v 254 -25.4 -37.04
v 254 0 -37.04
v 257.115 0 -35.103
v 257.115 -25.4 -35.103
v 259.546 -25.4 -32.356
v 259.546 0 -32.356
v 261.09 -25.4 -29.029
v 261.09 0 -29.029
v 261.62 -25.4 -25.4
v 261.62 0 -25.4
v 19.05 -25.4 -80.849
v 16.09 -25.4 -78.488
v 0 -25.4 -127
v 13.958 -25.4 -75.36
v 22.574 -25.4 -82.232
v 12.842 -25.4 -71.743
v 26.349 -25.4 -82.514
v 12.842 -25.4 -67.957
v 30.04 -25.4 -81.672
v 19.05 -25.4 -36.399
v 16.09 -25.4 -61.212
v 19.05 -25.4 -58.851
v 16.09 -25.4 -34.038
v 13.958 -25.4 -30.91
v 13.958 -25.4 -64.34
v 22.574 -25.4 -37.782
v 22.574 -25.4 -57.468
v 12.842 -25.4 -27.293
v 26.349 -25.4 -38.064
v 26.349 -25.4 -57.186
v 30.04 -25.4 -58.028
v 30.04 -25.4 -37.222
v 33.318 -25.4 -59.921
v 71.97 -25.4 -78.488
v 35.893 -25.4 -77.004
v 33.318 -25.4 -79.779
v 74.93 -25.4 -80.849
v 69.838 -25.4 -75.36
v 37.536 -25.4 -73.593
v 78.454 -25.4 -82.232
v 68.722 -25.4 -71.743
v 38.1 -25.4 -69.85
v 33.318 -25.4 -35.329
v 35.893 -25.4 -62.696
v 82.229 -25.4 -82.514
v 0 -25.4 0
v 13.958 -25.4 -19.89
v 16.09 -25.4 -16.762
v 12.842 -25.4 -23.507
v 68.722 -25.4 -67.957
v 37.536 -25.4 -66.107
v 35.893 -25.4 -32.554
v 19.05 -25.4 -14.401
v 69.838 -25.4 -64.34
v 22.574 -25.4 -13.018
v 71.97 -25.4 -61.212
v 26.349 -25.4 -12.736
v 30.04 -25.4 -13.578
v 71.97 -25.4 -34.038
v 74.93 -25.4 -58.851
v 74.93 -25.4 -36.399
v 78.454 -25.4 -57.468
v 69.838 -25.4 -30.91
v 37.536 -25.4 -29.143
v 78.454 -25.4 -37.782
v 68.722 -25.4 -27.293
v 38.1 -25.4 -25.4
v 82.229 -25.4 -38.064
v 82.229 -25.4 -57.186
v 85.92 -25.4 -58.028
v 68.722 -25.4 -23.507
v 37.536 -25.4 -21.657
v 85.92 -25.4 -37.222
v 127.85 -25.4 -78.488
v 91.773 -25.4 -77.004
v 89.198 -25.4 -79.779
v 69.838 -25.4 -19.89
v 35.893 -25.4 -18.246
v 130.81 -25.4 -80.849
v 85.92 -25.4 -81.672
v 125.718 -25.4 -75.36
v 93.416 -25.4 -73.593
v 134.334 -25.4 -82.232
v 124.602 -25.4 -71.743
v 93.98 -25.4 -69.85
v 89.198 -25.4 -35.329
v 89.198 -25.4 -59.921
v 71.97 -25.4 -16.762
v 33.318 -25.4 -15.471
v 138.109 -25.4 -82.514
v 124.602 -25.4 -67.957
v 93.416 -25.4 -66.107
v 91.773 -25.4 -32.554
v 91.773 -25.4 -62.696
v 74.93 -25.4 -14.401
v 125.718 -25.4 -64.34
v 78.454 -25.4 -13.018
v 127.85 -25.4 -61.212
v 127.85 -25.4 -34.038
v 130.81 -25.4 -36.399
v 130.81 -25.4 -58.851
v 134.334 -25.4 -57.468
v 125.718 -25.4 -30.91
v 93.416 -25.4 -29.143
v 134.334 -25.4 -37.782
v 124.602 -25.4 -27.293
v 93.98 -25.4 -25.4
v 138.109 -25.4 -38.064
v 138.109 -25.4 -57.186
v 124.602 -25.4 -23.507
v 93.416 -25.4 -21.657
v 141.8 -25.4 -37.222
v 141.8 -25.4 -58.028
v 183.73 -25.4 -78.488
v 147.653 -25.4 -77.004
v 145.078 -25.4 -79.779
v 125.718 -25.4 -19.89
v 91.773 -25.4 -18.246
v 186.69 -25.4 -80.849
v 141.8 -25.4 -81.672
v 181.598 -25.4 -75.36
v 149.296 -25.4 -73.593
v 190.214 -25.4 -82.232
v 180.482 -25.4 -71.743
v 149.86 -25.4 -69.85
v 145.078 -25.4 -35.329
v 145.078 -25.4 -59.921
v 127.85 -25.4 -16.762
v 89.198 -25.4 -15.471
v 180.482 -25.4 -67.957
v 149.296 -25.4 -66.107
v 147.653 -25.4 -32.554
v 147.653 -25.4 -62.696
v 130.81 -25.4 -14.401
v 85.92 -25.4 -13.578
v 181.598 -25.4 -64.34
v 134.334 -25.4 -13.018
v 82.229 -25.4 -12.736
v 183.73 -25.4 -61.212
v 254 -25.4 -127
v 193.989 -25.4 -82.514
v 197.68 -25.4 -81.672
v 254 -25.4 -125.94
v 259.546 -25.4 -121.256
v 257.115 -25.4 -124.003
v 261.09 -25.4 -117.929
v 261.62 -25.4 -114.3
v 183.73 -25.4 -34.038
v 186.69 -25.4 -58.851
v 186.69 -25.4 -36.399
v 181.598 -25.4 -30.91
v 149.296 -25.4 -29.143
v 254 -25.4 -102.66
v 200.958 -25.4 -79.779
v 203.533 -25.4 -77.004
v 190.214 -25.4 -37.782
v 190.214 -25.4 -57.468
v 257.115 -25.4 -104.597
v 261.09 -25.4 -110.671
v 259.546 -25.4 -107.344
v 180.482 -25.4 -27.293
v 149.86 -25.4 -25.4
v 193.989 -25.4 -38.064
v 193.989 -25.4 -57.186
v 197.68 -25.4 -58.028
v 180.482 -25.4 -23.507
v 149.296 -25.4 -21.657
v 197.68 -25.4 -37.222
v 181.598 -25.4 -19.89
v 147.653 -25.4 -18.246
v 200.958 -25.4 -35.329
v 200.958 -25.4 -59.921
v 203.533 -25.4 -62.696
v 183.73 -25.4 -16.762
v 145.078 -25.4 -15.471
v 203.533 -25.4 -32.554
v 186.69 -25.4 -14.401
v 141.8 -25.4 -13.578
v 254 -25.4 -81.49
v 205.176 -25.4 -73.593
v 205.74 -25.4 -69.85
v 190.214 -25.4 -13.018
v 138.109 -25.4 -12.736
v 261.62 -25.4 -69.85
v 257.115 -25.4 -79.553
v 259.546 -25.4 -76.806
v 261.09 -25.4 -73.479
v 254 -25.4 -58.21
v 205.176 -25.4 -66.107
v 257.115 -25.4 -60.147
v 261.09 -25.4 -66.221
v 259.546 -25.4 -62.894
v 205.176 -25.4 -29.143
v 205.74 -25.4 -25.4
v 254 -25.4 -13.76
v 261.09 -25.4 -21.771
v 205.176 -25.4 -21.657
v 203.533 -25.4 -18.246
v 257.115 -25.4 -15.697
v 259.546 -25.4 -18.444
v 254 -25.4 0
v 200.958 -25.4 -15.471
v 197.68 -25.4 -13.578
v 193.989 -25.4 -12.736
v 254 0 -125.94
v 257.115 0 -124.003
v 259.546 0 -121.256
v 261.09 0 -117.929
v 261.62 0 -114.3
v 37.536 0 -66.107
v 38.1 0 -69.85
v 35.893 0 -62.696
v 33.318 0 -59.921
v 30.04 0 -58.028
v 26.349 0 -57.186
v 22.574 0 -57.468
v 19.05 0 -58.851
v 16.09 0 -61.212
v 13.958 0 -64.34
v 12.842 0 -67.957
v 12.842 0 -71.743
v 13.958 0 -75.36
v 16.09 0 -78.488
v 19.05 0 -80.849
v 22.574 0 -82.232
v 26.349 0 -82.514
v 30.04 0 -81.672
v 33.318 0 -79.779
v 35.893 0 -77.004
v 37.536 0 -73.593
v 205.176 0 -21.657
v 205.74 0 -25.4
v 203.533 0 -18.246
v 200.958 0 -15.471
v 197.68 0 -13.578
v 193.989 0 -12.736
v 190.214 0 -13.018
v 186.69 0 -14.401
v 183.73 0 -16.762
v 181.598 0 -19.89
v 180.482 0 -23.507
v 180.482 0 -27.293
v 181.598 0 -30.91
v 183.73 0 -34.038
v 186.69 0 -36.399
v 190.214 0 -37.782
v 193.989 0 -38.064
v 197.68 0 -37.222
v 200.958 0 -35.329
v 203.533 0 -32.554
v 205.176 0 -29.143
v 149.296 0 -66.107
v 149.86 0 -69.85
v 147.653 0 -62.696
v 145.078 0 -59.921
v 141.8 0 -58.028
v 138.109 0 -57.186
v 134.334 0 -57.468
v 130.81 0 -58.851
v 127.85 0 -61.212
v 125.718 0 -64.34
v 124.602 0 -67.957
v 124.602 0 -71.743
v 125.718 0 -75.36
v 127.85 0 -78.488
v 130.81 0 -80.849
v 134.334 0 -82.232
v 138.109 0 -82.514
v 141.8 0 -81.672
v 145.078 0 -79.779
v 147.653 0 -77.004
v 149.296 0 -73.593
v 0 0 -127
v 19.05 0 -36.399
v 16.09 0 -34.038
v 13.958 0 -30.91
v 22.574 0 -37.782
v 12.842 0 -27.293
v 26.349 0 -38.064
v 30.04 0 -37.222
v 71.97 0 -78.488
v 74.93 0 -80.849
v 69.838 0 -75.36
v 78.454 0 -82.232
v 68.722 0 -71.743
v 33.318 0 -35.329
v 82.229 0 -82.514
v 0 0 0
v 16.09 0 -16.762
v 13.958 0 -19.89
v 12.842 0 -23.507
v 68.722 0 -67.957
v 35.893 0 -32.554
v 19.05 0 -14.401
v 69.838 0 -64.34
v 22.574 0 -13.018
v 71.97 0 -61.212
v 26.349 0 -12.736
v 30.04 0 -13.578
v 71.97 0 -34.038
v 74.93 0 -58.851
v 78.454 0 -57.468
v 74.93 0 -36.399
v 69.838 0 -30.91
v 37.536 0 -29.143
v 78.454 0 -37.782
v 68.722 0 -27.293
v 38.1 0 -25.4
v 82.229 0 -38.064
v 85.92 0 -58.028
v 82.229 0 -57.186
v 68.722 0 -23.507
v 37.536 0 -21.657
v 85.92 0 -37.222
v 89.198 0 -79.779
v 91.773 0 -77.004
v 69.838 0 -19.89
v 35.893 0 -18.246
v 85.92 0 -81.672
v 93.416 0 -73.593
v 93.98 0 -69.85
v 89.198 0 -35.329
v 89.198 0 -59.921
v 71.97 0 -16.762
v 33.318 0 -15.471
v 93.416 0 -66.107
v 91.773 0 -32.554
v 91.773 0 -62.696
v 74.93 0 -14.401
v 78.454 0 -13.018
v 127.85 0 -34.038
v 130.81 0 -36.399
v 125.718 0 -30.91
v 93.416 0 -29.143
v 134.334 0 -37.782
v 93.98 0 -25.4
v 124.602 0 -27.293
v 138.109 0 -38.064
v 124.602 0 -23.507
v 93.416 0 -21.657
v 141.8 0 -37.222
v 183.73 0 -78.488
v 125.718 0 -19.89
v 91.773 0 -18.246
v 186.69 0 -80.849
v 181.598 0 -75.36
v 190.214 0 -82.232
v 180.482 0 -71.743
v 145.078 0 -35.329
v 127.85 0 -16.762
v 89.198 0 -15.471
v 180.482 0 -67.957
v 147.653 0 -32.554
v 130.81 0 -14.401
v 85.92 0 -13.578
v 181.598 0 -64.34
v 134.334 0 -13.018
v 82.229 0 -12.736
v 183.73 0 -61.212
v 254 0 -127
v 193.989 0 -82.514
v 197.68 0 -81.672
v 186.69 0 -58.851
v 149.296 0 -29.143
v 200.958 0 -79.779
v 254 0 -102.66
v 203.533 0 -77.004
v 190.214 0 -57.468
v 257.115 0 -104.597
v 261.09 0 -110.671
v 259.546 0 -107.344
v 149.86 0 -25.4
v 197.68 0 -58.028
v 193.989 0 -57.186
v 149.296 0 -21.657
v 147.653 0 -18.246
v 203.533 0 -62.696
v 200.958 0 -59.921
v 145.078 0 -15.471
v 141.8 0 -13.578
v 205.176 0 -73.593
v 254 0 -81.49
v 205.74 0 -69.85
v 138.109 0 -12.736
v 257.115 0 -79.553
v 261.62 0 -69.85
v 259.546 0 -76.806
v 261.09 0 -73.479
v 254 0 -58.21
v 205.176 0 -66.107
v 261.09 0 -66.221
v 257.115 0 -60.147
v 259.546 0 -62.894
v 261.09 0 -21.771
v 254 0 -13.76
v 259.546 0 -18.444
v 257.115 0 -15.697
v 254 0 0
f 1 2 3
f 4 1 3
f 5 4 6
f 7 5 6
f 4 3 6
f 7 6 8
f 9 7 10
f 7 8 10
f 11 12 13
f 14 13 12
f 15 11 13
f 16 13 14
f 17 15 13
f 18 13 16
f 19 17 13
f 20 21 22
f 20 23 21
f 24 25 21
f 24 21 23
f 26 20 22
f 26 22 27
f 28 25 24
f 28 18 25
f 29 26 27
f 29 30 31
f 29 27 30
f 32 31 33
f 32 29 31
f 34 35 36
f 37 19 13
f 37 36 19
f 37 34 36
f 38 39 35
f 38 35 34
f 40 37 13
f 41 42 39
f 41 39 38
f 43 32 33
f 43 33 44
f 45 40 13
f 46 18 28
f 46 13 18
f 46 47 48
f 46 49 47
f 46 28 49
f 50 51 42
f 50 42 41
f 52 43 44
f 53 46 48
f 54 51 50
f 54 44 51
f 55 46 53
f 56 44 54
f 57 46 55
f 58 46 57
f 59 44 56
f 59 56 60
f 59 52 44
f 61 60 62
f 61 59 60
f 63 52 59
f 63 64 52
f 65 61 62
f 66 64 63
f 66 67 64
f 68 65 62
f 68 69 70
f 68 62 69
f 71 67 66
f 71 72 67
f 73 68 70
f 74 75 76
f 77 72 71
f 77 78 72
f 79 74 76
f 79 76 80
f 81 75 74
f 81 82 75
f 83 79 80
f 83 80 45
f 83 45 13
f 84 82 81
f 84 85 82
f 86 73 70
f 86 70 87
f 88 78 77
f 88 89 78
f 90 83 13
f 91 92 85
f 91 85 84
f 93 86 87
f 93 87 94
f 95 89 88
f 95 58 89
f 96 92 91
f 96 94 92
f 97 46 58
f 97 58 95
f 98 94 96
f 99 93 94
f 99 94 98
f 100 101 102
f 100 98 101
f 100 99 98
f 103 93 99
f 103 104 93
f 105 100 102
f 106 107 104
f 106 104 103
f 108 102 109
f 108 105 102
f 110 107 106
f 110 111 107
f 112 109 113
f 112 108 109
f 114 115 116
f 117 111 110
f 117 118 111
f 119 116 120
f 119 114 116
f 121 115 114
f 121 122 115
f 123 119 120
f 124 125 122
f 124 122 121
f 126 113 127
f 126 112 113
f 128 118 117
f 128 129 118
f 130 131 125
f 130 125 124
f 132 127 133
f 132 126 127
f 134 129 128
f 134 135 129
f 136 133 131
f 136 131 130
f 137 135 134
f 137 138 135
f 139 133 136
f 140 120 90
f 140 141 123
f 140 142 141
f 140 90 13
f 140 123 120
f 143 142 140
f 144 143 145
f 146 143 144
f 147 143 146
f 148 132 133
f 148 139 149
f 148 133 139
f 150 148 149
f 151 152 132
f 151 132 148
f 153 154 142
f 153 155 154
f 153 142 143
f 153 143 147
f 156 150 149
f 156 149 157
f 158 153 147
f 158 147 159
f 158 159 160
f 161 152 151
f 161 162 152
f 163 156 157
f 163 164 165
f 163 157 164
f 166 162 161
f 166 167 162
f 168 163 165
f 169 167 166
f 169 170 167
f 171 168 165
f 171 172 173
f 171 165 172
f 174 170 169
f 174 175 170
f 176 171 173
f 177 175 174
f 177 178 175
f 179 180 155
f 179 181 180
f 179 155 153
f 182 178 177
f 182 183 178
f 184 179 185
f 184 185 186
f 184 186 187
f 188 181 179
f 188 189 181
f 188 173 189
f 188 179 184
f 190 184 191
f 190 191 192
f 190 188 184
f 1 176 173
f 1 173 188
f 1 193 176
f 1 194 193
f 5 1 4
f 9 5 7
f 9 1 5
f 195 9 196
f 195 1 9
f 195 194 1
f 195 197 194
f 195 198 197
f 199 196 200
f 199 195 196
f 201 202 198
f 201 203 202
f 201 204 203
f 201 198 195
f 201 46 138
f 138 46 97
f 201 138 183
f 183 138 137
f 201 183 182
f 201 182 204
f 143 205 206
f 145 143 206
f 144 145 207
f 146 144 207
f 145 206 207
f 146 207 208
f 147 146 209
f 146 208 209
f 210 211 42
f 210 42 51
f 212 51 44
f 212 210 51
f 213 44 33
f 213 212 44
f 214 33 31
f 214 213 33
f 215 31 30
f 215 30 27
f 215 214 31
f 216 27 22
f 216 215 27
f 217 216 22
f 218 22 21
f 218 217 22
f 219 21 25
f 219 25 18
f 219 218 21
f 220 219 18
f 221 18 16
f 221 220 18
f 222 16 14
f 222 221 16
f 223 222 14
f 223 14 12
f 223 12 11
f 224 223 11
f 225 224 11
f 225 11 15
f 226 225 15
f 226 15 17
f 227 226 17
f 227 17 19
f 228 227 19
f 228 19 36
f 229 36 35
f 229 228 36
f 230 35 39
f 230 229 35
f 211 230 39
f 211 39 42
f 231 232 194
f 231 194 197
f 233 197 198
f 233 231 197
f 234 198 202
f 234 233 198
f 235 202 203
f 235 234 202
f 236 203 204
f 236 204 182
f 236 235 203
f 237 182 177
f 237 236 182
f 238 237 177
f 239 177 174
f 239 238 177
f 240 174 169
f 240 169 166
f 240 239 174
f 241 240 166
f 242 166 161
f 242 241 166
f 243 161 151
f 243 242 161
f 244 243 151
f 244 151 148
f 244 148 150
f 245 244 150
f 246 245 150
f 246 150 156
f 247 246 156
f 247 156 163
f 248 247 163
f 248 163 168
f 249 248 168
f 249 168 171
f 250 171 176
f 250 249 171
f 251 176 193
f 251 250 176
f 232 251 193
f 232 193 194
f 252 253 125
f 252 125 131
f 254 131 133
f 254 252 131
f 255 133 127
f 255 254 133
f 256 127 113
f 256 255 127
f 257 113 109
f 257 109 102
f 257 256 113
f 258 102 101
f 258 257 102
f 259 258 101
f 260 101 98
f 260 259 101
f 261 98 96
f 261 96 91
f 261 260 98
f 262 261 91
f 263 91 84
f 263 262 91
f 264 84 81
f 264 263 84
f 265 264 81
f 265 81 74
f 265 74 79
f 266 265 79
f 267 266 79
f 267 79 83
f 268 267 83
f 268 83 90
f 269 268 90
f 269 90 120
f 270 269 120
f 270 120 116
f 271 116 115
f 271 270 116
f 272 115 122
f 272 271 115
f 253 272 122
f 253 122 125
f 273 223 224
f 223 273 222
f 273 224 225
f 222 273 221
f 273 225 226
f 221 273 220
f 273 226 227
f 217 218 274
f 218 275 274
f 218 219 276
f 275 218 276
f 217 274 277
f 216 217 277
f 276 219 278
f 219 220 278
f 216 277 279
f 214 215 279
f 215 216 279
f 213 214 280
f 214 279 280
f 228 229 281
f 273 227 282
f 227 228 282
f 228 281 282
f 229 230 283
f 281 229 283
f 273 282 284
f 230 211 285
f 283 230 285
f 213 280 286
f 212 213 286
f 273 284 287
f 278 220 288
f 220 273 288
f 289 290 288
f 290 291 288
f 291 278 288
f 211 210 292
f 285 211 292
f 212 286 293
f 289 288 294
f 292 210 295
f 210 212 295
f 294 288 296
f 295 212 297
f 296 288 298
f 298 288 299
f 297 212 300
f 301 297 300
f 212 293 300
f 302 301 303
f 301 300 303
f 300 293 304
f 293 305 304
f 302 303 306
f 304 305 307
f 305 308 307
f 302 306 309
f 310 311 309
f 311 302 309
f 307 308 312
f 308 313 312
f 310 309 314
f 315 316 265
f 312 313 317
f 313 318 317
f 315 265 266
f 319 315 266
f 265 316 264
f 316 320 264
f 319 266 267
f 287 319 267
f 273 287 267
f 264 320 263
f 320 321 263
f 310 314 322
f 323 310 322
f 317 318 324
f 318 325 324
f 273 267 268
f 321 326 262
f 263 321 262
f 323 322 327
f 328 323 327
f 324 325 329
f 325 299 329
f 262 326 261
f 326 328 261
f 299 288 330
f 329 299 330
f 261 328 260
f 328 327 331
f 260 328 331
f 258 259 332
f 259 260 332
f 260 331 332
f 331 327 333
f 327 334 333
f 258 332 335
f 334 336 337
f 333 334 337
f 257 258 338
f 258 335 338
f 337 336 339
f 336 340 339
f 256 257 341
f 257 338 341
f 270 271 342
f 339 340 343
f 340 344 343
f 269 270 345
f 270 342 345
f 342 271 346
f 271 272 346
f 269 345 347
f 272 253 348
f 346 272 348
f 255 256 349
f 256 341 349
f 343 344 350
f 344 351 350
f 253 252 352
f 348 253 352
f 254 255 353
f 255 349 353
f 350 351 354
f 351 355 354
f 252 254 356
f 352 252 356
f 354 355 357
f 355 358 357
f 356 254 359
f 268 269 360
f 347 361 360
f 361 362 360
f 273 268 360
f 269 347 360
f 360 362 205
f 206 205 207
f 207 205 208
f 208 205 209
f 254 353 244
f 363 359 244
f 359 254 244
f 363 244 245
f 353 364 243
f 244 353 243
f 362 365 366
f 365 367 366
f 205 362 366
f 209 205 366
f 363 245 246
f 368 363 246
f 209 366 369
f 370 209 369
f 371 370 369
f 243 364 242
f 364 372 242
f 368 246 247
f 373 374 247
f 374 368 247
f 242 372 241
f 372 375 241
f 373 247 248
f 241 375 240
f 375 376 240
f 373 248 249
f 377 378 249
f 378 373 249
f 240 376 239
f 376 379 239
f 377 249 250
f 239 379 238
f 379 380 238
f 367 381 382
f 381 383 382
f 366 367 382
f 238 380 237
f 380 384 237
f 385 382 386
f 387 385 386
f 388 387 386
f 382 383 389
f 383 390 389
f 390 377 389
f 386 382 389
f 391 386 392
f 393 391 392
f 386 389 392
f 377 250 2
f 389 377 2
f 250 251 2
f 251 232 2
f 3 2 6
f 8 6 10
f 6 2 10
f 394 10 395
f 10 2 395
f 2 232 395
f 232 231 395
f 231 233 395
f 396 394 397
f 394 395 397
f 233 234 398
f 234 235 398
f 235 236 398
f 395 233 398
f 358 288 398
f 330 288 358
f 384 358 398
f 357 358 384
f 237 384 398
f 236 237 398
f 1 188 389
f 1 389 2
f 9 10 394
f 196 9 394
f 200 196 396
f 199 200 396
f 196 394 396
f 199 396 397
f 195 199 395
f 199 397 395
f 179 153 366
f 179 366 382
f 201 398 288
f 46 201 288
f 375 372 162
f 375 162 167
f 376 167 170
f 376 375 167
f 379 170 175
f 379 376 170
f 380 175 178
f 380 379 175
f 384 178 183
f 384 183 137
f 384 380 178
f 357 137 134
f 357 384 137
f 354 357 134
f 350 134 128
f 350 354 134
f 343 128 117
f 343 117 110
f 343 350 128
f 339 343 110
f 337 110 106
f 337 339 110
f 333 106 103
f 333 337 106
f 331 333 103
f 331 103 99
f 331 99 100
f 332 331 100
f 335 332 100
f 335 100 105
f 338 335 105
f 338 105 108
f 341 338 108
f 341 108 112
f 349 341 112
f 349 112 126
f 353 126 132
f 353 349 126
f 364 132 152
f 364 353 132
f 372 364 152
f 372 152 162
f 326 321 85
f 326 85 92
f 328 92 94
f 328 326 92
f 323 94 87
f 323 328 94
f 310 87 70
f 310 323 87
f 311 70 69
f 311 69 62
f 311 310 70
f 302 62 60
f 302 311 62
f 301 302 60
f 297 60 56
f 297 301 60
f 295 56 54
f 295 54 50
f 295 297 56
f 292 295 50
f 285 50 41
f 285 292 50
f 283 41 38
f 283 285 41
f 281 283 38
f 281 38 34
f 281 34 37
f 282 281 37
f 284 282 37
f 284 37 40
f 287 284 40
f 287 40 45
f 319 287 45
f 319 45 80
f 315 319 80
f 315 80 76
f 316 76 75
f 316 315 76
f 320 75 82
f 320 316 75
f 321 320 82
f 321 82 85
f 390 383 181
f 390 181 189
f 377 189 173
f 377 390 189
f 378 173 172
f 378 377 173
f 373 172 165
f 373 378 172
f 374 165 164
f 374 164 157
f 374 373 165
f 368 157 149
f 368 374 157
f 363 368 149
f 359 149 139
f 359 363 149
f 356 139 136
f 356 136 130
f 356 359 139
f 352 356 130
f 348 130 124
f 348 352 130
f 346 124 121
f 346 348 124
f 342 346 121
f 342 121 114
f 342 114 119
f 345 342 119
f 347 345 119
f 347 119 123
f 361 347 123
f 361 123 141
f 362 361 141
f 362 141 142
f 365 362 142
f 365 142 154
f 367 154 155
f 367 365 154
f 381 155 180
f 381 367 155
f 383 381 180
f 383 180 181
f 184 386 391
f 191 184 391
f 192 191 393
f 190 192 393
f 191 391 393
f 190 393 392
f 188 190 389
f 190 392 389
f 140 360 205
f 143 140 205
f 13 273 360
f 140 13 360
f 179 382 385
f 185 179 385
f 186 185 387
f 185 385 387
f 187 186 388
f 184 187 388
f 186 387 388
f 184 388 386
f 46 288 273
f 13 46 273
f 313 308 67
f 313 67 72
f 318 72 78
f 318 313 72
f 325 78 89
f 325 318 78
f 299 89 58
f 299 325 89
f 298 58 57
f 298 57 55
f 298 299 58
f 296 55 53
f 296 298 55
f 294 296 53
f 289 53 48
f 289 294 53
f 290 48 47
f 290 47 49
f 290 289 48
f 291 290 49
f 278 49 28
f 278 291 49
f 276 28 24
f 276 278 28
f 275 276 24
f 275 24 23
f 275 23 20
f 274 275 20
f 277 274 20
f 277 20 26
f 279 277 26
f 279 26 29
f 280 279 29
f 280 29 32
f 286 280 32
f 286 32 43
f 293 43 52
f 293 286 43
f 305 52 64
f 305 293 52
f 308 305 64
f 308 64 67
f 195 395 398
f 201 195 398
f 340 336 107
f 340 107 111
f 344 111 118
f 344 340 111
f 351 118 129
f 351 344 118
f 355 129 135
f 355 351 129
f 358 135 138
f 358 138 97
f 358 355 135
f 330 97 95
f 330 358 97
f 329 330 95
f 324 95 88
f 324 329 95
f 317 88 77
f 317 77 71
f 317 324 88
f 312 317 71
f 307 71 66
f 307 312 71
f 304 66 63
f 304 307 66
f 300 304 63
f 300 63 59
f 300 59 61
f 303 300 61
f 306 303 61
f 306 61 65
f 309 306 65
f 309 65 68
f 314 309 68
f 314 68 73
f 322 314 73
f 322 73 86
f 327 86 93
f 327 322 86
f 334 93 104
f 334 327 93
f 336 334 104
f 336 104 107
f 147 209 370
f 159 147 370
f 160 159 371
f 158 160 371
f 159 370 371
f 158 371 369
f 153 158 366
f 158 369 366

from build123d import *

# Parameters (mm, degrees)
F0_R     = 12.7
F1_DEPTH = 25.4


with BuildPart() as f1:
    # F0 (on Front) → F1 (new body)
    with BuildSketch(Plane.XZ):
        with BuildLine():
            Line((254, 0), (0, 0))
            Line((0, 0), (0, -127))
            Line((0, -127), (25.4, -127))
            Line((25.4, -127), (81.28, -127))
            Line((81.28, -127), (137.16, -127))
            Line((137.16, -127), (193.04, -127))
            Line((193.04, -127), (248.92, -127))
            ThreePointArc((248.92, -127), (236.4878898258, -111.7052675251), (254, -102.6602577348))
            Line((254, -102.6602577348), (254, -81.4897422652))
            ThreePointArc((254, -81.4897422652), (236.22, -69.85), (254, -58.2102577348))
            Line((254, -58.2102577348), (254, -37.0397422652))
            ThreePointArc((254, -37.0397422652), (236.22, -25.4), (254, -13.7602577348))
            Line((254, -13.7602577348), (254, 0))
        make_face()
        with BuildLine():
            ThreePointArc((38.1, -114.3), (34.3802561211, -123.2802561211), (25.4, -127))
            ThreePointArc((25.4, -127), (16.4197438789, -105.3197438789), (38.1, -114.3))
        make_face(mode=Mode.SUBTRACT)
        with BuildLine():
            ThreePointArc((93.98, -114.3), (90.2602561211, -123.2802561211), (81.28, -127))
            ThreePointArc((81.28, -127), (72.2997438789, -105.3197438789), (93.98, -114.3))
        make_face(mode=Mode.SUBTRACT)
        with Locations((25.4, -69.85)):
            Circle(F0_R, mode=Mode.SUBTRACT)
        with Locations((81.28, -69.85)):
            Circle(F0_R, mode=Mode.SUBTRACT)
        with BuildLine():
            ThreePointArc((149.86, -114.3), (146.1402561211, -123.2802561211), (137.16, -127))
            ThreePointArc((137.16, -127), (128.1797438789, -105.3197438789), (149.86, -114.3))
        make_face(mode=Mode.SUBTRACT)
        with BuildLine():
            ThreePointArc((205.74, -114.3), (202.0202561211, -123.2802561211), (193.04, -127))
            ThreePointArc((193.04, -127), (184.0597438789, -105.3197438789), (205.74, -114.3))
        make_face(mode=Mode.SUBTRACT)
        with Locations((137.16, -69.85)):
            Circle(F0_R, mode=Mode.SUBTRACT)
        with Locations((193.04, -69.85)):
            Circle(F0_R, mode=Mode.SUBTRACT)
        with Locations((25.4, -25.4)):
            Circle(F0_R, mode=Mode.SUBTRACT)
        with Locations((81.28, -25.4)):
            Circle(F0_R, mode=Mode.SUBTRACT)
        with Locations((137.16, -25.4)):
            Circle(F0_R, mode=Mode.SUBTRACT)
        with Locations((193.04, -25.4)):
            Circle(F0_R, mode=Mode.SUBTRACT)
        with BuildLine():
            ThreePointArc((38.1, -114.3), (16.4197438789, -105.3197438789), (25.4, -127))
            ThreePointArc((25.4, -127), (34.3802561211, -123.2802561211), (38.1, -114.3))
        make_face()
        with BuildLine():
            ThreePointArc((93.98, -114.3), (72.2997438789, -105.3197438789), (81.28, -127))
            ThreePointArc((81.28, -127), (90.2602561211, -123.2802561211), (93.98, -114.3))
        make_face()
        with BuildLine():
            ThreePointArc((149.86, -114.3), (128.1797438789, -105.3197438789), (137.16, -127))
            ThreePointArc((137.16, -127), (146.1402561211, -123.2802561211), (149.86, -114.3))
        make_face()
        with BuildLine():
            ThreePointArc((205.74, -114.3), (184.0597438789, -105.3197438789), (193.04, -127))
            ThreePointArc((193.04, -127), (202.0202561211, -123.2802561211), (205.74, -114.3))
        make_face()
        with BuildLine():
            Line((254, -37.0397422652), (254, -13.7602577348))
            ThreePointArc((254, -13.7602577348), (236.22, -25.4), (254, -37.0397422652))
        make_face()
        with BuildLine():
            Line((254, -81.4897422652), (254, -58.2102577348))
            ThreePointArc((254, -58.2102577348), (236.22, -69.85), (254, -81.4897422652))
        make_face()
        with BuildLine():
            Line((254, -125.9397422652), (254, -102.6602577348))
            ThreePointArc((254, -102.6602577348), (236.4878898258, -111.7052675251), (248.92, -127))
            ThreePointArc((248.92, -127), (251.5147324749, -126.7321101742), (254, -125.9397422652))
        make_face()
        with BuildLine():
            ThreePointArc((261.62, -25.4), (259.545582337, -18.4439235197), (254, -13.7602577348))
            Line((254, -13.7602577348), (254, -37.0397422652))
            ThreePointArc((254, -37.0397422652), (259.545582337, -32.3560764803), (261.62, -25.4))
        make_face()
        with BuildLine():
            ThreePointArc((261.62, -69.85), (259.545582337, -62.8939235197), (254, -58.2102577348))
            Line((254, -58.2102577348), (254, -81.4897422652))
            ThreePointArc((254, -81.4897422652), (259.545582337, -76.8060764803), (261.62, -69.85))
        make_face()
        with BuildLine():
            ThreePointArc((261.62, -114.3), (259.545582337, -107.3439235197), (254, -102.6602577348))
            Line((254, -102.6602577348), (254, -125.9397422652))
            ThreePointArc((254, -125.9397422652), (259.545582337, -121.2560764803), (261.62, -114.3))
        make_face()
        with BuildLine():
            ThreePointArc((254, -125.9397422652), (251.5147324749, -126.7321101742), (248.92, -127))
            Line((248.92, -127), (254, -127))
            Line((254, -127), (254, -125.9397422652))
        make_face()
    extrude(amount=F1_DEPTH)


solid = f1.part
